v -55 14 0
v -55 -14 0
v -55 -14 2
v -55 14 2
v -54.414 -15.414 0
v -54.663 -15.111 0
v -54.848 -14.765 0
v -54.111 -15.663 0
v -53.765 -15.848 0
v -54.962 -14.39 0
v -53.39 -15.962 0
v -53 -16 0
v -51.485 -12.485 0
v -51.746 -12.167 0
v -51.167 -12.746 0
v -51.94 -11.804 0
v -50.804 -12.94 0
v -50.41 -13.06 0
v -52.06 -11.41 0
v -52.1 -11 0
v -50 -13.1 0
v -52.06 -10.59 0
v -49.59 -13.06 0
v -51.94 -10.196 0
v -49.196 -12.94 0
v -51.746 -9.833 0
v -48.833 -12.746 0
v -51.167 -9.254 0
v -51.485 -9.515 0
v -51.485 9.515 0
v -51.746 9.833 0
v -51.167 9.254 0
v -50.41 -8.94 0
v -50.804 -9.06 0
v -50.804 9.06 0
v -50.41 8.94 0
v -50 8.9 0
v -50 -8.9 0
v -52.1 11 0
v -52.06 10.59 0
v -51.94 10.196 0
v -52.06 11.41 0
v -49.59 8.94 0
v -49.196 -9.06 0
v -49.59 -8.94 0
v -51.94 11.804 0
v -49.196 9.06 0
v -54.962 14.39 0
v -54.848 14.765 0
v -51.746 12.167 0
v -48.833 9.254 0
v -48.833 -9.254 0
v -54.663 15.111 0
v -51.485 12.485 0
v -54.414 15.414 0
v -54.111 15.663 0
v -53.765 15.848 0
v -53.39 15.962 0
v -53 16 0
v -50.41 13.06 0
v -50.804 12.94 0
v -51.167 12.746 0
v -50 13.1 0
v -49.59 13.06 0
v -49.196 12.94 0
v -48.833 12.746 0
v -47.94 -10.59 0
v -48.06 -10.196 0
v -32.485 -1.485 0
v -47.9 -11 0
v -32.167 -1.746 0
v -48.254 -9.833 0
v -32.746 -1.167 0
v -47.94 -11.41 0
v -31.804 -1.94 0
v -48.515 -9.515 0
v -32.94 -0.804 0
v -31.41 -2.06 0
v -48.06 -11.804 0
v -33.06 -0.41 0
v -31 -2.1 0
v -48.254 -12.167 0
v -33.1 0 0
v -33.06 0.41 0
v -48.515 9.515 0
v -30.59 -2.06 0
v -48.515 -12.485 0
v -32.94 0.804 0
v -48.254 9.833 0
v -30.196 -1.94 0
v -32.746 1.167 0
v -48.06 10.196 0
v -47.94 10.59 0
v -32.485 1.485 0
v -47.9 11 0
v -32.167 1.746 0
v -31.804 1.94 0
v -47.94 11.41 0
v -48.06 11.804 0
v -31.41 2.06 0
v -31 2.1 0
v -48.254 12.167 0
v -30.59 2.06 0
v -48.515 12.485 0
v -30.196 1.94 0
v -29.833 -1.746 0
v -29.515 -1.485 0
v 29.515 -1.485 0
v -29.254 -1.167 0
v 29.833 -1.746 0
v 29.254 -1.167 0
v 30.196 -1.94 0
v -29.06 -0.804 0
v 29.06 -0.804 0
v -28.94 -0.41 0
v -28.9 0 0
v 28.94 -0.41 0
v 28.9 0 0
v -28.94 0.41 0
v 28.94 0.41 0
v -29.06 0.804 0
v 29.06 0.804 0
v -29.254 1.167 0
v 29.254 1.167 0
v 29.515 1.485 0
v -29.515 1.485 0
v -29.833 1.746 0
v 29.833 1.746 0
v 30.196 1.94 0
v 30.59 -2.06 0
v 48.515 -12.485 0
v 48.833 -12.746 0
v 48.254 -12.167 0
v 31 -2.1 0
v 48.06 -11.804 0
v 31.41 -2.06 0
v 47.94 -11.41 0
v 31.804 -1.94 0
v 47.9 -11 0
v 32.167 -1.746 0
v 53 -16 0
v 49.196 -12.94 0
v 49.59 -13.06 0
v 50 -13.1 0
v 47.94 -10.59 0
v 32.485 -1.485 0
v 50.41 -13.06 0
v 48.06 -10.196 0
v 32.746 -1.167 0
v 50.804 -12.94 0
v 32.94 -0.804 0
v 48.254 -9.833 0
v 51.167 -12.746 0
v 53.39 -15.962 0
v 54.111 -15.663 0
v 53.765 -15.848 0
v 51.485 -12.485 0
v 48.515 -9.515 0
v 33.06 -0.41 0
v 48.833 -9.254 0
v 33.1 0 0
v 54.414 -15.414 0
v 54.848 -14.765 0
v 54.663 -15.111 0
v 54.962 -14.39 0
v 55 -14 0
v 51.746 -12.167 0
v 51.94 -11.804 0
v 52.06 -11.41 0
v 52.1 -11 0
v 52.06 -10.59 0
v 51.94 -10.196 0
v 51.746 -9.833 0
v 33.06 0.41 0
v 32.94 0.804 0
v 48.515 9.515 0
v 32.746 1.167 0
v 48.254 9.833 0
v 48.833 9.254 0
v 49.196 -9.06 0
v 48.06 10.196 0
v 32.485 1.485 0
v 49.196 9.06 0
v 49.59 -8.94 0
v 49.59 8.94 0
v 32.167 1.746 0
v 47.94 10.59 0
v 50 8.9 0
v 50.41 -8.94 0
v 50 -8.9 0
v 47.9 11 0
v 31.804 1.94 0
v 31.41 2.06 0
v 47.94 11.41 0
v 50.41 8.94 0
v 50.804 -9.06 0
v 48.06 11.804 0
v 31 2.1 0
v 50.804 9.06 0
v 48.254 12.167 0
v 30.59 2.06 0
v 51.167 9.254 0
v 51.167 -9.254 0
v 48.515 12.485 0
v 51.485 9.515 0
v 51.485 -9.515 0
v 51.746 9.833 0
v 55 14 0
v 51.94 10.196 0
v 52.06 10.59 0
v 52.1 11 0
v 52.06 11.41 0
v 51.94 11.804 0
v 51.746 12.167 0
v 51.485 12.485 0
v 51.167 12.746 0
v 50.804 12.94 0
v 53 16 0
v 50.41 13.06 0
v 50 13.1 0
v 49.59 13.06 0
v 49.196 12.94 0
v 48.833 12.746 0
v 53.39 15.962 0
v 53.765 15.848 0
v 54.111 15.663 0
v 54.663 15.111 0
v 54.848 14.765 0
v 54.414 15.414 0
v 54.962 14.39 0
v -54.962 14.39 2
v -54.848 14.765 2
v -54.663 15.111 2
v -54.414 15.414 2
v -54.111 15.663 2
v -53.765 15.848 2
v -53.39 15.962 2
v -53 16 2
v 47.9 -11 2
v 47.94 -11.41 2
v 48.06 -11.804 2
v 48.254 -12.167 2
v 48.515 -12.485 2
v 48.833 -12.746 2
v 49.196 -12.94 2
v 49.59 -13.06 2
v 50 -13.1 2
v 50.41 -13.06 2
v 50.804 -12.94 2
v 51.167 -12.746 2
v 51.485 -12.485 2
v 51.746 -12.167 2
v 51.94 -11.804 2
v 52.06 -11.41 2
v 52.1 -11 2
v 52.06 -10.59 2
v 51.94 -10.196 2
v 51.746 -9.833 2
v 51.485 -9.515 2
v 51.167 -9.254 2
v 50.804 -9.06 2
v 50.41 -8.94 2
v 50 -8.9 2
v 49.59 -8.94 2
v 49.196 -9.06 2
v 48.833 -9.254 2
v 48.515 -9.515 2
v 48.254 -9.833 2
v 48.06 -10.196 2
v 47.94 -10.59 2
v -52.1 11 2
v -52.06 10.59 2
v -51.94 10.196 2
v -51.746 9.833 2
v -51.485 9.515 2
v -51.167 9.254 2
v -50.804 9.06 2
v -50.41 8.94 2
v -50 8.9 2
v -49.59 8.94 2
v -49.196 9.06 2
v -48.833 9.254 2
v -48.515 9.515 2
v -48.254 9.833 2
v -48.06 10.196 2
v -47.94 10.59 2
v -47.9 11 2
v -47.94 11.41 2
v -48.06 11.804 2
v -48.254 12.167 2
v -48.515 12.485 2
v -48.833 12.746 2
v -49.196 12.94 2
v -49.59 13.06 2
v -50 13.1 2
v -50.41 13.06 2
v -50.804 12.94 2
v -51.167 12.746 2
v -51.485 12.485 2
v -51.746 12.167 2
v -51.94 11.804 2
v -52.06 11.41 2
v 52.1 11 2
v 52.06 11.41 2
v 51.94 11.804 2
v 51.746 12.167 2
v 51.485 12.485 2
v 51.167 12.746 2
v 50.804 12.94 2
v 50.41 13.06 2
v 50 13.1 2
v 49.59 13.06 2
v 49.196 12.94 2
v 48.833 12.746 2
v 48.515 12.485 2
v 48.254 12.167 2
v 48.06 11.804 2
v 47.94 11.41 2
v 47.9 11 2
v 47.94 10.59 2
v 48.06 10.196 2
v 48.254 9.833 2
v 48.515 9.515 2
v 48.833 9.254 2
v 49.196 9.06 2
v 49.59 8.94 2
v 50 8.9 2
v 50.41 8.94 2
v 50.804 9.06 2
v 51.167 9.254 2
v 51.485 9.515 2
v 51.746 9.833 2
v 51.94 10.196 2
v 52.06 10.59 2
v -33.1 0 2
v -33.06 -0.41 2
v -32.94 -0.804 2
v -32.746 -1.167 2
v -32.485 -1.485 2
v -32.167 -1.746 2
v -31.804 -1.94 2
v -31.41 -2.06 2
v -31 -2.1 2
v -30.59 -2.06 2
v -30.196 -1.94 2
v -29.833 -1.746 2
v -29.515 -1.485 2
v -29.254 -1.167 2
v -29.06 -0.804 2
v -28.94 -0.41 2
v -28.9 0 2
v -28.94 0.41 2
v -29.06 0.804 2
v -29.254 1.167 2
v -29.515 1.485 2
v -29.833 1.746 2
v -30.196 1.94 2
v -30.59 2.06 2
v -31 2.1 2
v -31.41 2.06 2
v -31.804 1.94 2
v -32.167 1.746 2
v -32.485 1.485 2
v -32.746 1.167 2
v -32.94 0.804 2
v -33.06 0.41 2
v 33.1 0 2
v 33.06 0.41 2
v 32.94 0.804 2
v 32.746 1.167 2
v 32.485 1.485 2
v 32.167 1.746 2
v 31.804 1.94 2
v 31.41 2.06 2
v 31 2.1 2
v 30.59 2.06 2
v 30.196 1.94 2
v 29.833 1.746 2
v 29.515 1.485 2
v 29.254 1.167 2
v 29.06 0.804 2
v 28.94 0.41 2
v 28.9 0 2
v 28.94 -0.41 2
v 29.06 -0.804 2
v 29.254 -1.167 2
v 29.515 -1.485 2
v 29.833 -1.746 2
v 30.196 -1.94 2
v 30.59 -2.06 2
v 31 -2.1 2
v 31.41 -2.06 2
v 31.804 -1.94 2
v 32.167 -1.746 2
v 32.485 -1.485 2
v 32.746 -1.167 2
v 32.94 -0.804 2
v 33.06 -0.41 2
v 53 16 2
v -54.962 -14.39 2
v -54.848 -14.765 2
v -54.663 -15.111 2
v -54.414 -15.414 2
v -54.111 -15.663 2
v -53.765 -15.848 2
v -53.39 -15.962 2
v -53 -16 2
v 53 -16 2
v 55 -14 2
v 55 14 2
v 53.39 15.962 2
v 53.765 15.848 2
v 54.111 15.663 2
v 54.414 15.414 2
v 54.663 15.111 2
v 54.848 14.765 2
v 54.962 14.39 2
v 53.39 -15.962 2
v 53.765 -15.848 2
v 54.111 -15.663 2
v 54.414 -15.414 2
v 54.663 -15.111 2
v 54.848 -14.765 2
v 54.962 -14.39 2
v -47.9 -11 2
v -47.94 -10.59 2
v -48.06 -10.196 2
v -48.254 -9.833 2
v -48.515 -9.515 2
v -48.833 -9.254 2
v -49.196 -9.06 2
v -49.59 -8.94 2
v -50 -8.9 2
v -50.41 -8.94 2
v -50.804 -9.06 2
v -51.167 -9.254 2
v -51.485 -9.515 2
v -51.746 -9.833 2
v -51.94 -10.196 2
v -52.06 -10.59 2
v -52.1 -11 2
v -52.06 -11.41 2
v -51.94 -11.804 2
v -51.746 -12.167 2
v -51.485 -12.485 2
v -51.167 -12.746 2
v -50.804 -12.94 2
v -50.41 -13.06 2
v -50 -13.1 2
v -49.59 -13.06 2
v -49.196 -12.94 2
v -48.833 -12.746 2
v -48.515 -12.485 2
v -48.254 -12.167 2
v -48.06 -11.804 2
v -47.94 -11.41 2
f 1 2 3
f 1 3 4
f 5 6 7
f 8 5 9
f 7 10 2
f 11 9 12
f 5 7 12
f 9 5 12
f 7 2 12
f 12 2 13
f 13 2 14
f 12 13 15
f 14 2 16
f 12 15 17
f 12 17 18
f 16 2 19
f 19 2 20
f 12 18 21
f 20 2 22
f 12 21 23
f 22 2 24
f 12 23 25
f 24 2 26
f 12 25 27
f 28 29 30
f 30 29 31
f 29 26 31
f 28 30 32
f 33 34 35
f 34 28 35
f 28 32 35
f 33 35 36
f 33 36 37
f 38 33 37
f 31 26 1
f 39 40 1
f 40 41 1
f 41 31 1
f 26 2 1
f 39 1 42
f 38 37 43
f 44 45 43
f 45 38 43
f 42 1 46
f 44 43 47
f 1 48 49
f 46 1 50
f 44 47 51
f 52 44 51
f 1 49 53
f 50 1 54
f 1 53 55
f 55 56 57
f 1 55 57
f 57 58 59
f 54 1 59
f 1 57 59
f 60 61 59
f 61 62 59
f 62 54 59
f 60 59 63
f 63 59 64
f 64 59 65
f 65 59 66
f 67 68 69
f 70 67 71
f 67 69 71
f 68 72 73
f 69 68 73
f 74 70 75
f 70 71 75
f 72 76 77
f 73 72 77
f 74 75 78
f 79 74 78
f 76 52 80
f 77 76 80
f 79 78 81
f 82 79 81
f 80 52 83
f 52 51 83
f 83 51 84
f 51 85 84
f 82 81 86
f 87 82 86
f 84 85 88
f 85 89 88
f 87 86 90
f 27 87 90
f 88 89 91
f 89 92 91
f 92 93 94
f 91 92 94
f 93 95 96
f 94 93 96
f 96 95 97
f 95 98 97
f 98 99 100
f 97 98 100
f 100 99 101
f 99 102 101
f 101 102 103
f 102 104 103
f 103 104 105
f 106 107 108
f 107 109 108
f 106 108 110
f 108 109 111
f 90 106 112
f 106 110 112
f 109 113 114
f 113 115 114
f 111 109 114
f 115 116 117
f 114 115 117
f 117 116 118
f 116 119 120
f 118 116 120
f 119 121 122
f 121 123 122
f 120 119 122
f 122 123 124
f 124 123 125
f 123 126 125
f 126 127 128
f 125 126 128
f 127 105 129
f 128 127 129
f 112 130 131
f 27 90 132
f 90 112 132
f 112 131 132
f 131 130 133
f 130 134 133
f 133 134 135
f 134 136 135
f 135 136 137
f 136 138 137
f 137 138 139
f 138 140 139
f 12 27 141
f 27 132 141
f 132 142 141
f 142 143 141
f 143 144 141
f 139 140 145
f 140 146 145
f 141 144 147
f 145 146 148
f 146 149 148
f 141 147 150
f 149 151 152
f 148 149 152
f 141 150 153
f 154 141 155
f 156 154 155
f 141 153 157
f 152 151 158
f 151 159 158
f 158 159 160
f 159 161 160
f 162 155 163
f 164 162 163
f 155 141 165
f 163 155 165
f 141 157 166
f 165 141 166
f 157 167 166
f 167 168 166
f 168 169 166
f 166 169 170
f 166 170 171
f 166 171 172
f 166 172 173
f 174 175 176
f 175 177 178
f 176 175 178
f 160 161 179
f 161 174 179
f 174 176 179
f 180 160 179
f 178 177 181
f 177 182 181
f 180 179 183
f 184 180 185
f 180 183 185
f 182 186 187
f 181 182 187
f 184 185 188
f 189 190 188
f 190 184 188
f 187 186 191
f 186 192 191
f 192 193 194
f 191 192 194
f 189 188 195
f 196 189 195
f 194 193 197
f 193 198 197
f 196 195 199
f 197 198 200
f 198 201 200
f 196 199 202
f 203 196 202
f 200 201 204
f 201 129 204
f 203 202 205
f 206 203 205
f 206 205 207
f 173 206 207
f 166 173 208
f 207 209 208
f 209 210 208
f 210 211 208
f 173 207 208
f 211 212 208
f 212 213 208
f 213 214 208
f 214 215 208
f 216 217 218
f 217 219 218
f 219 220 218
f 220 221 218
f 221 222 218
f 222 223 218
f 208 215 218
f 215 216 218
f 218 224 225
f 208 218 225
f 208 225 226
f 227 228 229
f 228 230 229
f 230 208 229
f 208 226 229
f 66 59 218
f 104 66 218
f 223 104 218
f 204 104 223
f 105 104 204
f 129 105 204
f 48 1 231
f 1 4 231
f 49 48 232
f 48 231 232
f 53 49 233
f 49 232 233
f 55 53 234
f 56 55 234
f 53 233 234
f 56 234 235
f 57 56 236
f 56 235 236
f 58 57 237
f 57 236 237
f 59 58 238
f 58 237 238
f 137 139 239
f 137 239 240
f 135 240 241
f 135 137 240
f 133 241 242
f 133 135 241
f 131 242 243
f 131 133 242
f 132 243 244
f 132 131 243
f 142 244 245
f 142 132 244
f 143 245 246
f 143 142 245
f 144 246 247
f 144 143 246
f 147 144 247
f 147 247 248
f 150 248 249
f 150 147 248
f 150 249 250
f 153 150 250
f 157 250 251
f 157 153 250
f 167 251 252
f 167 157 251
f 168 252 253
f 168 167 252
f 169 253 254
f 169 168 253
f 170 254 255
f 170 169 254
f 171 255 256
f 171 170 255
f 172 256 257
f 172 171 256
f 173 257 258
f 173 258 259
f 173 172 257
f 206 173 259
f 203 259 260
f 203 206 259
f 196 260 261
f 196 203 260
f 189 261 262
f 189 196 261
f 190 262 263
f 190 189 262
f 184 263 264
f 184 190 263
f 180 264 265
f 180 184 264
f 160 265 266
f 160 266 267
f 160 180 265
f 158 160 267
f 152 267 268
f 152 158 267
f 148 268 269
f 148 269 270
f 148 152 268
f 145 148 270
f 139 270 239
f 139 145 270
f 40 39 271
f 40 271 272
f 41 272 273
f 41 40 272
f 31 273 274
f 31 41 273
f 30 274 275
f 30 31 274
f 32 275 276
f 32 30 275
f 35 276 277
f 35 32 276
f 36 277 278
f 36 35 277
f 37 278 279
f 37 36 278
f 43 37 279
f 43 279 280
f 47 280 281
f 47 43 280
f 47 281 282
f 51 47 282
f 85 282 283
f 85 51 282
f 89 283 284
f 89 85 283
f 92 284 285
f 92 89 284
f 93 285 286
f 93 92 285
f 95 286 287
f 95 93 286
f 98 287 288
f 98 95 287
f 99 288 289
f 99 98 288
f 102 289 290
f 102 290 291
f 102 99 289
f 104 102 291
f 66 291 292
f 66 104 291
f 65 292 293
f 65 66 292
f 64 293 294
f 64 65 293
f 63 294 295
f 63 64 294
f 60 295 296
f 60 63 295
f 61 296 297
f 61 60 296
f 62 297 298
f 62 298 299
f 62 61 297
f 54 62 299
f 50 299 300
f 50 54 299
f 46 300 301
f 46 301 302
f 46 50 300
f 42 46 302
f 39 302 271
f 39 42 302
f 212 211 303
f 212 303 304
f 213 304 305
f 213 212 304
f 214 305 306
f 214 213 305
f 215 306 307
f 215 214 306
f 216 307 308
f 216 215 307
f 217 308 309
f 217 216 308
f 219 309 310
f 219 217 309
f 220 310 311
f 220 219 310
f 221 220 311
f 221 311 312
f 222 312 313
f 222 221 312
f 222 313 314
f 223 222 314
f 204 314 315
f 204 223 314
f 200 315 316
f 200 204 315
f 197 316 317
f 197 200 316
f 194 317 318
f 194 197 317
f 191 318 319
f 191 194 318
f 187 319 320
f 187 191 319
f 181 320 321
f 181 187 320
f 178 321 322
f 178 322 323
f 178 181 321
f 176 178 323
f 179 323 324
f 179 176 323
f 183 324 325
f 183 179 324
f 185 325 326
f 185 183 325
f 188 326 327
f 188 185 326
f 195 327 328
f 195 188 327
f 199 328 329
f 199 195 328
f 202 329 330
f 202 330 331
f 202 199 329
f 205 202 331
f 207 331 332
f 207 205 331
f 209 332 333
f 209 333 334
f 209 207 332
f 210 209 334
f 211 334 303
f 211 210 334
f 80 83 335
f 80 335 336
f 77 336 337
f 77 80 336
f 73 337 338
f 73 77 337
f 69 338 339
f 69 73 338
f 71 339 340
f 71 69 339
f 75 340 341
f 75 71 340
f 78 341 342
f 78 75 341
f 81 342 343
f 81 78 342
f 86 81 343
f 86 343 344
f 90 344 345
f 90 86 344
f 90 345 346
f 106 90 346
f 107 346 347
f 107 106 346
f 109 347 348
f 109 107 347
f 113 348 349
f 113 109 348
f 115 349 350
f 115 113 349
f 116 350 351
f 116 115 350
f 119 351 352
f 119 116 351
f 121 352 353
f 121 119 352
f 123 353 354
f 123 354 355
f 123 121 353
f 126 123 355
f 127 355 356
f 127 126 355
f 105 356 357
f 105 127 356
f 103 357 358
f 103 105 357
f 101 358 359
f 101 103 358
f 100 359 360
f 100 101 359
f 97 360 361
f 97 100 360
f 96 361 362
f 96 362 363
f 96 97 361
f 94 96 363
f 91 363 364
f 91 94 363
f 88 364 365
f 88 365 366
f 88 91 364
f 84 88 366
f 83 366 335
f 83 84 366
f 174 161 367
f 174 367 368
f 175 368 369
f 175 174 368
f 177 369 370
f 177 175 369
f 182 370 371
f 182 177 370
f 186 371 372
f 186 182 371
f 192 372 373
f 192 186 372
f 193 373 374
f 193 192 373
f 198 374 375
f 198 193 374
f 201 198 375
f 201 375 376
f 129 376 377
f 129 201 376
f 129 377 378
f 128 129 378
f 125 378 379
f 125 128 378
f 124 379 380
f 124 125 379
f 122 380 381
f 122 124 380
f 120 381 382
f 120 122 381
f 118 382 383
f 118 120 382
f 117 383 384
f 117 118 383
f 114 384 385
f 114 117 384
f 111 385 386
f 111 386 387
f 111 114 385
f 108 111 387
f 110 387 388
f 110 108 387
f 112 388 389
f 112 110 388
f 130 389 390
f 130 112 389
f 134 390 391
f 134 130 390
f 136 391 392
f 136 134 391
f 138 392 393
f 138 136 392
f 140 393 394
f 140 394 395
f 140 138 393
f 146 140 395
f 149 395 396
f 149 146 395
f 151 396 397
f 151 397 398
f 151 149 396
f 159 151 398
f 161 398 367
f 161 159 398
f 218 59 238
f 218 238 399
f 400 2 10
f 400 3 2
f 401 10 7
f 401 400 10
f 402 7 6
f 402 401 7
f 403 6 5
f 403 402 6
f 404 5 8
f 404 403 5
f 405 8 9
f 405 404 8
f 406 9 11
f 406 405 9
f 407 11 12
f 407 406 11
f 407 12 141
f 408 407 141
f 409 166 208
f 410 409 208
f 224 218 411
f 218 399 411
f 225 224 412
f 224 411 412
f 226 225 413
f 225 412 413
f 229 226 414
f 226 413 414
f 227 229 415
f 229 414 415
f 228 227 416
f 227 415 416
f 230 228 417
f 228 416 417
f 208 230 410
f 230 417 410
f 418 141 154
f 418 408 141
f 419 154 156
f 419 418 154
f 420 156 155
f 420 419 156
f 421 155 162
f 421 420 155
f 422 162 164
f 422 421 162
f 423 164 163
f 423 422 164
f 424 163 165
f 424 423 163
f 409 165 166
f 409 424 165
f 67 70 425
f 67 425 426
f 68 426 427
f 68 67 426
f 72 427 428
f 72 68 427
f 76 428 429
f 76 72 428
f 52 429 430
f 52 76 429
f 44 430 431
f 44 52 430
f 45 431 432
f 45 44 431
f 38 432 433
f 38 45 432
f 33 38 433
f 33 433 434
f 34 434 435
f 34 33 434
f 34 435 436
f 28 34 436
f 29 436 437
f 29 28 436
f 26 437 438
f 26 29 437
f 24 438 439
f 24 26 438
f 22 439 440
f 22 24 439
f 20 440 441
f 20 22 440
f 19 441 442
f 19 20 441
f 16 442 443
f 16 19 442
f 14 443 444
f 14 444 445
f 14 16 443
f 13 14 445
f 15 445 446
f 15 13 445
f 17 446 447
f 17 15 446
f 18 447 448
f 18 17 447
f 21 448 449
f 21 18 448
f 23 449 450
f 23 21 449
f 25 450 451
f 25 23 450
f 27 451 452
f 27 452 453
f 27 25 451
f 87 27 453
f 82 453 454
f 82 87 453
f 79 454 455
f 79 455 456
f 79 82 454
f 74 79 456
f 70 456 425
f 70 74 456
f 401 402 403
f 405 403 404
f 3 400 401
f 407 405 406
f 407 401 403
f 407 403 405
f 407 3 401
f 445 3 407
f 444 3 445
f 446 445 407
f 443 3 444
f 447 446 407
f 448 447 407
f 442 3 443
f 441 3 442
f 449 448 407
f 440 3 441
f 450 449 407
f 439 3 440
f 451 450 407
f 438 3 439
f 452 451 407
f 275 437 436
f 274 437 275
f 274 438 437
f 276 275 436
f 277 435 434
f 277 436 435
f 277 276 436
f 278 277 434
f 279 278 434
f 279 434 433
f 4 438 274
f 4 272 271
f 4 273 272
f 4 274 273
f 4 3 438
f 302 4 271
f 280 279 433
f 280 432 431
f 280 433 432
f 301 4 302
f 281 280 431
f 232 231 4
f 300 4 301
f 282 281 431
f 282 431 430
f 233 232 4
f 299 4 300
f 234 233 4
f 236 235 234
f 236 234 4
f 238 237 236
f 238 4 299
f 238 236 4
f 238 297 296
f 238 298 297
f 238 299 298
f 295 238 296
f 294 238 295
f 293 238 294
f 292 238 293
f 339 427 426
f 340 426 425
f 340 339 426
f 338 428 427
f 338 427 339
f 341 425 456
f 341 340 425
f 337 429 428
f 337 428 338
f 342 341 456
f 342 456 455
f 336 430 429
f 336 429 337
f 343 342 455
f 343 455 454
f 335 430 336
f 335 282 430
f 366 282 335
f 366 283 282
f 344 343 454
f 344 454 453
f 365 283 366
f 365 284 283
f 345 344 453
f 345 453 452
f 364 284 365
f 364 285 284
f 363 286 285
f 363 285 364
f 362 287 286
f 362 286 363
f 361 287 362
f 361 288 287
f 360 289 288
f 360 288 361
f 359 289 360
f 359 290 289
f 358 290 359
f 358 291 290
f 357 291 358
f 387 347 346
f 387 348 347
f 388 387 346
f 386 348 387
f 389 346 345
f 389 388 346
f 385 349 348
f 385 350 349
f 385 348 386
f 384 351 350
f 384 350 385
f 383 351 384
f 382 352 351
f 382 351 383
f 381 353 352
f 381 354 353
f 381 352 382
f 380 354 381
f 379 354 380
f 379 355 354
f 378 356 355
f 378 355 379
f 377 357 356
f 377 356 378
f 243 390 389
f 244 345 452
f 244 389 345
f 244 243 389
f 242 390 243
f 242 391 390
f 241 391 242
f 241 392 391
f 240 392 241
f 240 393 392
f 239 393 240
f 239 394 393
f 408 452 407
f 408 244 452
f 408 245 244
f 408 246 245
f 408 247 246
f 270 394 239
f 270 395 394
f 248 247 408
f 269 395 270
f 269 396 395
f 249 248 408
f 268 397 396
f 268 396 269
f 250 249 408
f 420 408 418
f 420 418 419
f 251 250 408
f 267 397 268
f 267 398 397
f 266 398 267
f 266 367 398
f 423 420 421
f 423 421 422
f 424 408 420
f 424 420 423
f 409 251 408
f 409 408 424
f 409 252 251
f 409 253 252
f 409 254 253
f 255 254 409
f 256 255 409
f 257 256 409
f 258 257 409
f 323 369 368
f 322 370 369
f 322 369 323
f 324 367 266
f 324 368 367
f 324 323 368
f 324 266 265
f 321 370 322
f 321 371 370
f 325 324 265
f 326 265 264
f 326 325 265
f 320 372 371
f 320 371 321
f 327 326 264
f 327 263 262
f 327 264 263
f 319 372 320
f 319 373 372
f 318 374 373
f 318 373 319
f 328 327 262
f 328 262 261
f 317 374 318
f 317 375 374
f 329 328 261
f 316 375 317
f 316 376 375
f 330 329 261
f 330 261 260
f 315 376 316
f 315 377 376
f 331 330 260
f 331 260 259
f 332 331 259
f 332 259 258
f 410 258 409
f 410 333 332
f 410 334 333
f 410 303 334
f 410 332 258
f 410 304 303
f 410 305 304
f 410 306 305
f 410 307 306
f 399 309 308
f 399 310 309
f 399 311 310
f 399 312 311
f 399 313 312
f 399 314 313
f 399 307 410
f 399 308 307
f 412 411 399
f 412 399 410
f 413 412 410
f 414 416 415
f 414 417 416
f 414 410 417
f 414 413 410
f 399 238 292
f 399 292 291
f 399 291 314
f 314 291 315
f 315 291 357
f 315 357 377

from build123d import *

# Parameters (mm, degrees)
SKETCH_1_W      = 110
SKETCH_1_H      = 32
SKETCH_1_R      = 2.1
EXTRUDE_1_DEPTH = 2
FILLET_1_R      = 2


with BuildPart() as part:
    # ｽｹｯﾁ1 → ﾎﾞｽ - 押し出し1 (new body)
    with BuildSketch(Plane.XY):
        Rectangle(SKETCH_1_W, SKETCH_1_H)
        with Locations((31, 0)):
            Circle(SKETCH_1_R, mode=Mode.SUBTRACT)
        with Locations(Location((-31, 0, 0), (0, 0, 180))):
            Circle(SKETCH_1_R, mode=Mode.SUBTRACT)
        with Locations((50, 11)):
            Circle(SKETCH_1_R, mode=Mode.SUBTRACT)
        with Locations(Location((-50, 11, 0), (0, 0, 180))):
            Circle(SKETCH_1_R, mode=Mode.SUBTRACT)
        with Locations((-50, -11)):
            Circle(SKETCH_1_R, mode=Mode.SUBTRACT)
        with Locations(Location((50, -11, 0), (0, 0, 180))):
            Circle(SKETCH_1_R, mode=Mode.SUBTRACT)
    extrude(amount=EXTRUDE_1_DEPTH)

    # ﾌｨﾚｯﾄ1
    fillet_1_edges = [part.edges().sort_by_distance(p)[0] for p in [
        (55, -16, 1),
        (-55, -16, 1),
        (-55, 16, 1),
        (55, 16, 1),
    ]]
    fillet(fillet_1_edges, radius=FILLET_1_R)


solid = part.part
